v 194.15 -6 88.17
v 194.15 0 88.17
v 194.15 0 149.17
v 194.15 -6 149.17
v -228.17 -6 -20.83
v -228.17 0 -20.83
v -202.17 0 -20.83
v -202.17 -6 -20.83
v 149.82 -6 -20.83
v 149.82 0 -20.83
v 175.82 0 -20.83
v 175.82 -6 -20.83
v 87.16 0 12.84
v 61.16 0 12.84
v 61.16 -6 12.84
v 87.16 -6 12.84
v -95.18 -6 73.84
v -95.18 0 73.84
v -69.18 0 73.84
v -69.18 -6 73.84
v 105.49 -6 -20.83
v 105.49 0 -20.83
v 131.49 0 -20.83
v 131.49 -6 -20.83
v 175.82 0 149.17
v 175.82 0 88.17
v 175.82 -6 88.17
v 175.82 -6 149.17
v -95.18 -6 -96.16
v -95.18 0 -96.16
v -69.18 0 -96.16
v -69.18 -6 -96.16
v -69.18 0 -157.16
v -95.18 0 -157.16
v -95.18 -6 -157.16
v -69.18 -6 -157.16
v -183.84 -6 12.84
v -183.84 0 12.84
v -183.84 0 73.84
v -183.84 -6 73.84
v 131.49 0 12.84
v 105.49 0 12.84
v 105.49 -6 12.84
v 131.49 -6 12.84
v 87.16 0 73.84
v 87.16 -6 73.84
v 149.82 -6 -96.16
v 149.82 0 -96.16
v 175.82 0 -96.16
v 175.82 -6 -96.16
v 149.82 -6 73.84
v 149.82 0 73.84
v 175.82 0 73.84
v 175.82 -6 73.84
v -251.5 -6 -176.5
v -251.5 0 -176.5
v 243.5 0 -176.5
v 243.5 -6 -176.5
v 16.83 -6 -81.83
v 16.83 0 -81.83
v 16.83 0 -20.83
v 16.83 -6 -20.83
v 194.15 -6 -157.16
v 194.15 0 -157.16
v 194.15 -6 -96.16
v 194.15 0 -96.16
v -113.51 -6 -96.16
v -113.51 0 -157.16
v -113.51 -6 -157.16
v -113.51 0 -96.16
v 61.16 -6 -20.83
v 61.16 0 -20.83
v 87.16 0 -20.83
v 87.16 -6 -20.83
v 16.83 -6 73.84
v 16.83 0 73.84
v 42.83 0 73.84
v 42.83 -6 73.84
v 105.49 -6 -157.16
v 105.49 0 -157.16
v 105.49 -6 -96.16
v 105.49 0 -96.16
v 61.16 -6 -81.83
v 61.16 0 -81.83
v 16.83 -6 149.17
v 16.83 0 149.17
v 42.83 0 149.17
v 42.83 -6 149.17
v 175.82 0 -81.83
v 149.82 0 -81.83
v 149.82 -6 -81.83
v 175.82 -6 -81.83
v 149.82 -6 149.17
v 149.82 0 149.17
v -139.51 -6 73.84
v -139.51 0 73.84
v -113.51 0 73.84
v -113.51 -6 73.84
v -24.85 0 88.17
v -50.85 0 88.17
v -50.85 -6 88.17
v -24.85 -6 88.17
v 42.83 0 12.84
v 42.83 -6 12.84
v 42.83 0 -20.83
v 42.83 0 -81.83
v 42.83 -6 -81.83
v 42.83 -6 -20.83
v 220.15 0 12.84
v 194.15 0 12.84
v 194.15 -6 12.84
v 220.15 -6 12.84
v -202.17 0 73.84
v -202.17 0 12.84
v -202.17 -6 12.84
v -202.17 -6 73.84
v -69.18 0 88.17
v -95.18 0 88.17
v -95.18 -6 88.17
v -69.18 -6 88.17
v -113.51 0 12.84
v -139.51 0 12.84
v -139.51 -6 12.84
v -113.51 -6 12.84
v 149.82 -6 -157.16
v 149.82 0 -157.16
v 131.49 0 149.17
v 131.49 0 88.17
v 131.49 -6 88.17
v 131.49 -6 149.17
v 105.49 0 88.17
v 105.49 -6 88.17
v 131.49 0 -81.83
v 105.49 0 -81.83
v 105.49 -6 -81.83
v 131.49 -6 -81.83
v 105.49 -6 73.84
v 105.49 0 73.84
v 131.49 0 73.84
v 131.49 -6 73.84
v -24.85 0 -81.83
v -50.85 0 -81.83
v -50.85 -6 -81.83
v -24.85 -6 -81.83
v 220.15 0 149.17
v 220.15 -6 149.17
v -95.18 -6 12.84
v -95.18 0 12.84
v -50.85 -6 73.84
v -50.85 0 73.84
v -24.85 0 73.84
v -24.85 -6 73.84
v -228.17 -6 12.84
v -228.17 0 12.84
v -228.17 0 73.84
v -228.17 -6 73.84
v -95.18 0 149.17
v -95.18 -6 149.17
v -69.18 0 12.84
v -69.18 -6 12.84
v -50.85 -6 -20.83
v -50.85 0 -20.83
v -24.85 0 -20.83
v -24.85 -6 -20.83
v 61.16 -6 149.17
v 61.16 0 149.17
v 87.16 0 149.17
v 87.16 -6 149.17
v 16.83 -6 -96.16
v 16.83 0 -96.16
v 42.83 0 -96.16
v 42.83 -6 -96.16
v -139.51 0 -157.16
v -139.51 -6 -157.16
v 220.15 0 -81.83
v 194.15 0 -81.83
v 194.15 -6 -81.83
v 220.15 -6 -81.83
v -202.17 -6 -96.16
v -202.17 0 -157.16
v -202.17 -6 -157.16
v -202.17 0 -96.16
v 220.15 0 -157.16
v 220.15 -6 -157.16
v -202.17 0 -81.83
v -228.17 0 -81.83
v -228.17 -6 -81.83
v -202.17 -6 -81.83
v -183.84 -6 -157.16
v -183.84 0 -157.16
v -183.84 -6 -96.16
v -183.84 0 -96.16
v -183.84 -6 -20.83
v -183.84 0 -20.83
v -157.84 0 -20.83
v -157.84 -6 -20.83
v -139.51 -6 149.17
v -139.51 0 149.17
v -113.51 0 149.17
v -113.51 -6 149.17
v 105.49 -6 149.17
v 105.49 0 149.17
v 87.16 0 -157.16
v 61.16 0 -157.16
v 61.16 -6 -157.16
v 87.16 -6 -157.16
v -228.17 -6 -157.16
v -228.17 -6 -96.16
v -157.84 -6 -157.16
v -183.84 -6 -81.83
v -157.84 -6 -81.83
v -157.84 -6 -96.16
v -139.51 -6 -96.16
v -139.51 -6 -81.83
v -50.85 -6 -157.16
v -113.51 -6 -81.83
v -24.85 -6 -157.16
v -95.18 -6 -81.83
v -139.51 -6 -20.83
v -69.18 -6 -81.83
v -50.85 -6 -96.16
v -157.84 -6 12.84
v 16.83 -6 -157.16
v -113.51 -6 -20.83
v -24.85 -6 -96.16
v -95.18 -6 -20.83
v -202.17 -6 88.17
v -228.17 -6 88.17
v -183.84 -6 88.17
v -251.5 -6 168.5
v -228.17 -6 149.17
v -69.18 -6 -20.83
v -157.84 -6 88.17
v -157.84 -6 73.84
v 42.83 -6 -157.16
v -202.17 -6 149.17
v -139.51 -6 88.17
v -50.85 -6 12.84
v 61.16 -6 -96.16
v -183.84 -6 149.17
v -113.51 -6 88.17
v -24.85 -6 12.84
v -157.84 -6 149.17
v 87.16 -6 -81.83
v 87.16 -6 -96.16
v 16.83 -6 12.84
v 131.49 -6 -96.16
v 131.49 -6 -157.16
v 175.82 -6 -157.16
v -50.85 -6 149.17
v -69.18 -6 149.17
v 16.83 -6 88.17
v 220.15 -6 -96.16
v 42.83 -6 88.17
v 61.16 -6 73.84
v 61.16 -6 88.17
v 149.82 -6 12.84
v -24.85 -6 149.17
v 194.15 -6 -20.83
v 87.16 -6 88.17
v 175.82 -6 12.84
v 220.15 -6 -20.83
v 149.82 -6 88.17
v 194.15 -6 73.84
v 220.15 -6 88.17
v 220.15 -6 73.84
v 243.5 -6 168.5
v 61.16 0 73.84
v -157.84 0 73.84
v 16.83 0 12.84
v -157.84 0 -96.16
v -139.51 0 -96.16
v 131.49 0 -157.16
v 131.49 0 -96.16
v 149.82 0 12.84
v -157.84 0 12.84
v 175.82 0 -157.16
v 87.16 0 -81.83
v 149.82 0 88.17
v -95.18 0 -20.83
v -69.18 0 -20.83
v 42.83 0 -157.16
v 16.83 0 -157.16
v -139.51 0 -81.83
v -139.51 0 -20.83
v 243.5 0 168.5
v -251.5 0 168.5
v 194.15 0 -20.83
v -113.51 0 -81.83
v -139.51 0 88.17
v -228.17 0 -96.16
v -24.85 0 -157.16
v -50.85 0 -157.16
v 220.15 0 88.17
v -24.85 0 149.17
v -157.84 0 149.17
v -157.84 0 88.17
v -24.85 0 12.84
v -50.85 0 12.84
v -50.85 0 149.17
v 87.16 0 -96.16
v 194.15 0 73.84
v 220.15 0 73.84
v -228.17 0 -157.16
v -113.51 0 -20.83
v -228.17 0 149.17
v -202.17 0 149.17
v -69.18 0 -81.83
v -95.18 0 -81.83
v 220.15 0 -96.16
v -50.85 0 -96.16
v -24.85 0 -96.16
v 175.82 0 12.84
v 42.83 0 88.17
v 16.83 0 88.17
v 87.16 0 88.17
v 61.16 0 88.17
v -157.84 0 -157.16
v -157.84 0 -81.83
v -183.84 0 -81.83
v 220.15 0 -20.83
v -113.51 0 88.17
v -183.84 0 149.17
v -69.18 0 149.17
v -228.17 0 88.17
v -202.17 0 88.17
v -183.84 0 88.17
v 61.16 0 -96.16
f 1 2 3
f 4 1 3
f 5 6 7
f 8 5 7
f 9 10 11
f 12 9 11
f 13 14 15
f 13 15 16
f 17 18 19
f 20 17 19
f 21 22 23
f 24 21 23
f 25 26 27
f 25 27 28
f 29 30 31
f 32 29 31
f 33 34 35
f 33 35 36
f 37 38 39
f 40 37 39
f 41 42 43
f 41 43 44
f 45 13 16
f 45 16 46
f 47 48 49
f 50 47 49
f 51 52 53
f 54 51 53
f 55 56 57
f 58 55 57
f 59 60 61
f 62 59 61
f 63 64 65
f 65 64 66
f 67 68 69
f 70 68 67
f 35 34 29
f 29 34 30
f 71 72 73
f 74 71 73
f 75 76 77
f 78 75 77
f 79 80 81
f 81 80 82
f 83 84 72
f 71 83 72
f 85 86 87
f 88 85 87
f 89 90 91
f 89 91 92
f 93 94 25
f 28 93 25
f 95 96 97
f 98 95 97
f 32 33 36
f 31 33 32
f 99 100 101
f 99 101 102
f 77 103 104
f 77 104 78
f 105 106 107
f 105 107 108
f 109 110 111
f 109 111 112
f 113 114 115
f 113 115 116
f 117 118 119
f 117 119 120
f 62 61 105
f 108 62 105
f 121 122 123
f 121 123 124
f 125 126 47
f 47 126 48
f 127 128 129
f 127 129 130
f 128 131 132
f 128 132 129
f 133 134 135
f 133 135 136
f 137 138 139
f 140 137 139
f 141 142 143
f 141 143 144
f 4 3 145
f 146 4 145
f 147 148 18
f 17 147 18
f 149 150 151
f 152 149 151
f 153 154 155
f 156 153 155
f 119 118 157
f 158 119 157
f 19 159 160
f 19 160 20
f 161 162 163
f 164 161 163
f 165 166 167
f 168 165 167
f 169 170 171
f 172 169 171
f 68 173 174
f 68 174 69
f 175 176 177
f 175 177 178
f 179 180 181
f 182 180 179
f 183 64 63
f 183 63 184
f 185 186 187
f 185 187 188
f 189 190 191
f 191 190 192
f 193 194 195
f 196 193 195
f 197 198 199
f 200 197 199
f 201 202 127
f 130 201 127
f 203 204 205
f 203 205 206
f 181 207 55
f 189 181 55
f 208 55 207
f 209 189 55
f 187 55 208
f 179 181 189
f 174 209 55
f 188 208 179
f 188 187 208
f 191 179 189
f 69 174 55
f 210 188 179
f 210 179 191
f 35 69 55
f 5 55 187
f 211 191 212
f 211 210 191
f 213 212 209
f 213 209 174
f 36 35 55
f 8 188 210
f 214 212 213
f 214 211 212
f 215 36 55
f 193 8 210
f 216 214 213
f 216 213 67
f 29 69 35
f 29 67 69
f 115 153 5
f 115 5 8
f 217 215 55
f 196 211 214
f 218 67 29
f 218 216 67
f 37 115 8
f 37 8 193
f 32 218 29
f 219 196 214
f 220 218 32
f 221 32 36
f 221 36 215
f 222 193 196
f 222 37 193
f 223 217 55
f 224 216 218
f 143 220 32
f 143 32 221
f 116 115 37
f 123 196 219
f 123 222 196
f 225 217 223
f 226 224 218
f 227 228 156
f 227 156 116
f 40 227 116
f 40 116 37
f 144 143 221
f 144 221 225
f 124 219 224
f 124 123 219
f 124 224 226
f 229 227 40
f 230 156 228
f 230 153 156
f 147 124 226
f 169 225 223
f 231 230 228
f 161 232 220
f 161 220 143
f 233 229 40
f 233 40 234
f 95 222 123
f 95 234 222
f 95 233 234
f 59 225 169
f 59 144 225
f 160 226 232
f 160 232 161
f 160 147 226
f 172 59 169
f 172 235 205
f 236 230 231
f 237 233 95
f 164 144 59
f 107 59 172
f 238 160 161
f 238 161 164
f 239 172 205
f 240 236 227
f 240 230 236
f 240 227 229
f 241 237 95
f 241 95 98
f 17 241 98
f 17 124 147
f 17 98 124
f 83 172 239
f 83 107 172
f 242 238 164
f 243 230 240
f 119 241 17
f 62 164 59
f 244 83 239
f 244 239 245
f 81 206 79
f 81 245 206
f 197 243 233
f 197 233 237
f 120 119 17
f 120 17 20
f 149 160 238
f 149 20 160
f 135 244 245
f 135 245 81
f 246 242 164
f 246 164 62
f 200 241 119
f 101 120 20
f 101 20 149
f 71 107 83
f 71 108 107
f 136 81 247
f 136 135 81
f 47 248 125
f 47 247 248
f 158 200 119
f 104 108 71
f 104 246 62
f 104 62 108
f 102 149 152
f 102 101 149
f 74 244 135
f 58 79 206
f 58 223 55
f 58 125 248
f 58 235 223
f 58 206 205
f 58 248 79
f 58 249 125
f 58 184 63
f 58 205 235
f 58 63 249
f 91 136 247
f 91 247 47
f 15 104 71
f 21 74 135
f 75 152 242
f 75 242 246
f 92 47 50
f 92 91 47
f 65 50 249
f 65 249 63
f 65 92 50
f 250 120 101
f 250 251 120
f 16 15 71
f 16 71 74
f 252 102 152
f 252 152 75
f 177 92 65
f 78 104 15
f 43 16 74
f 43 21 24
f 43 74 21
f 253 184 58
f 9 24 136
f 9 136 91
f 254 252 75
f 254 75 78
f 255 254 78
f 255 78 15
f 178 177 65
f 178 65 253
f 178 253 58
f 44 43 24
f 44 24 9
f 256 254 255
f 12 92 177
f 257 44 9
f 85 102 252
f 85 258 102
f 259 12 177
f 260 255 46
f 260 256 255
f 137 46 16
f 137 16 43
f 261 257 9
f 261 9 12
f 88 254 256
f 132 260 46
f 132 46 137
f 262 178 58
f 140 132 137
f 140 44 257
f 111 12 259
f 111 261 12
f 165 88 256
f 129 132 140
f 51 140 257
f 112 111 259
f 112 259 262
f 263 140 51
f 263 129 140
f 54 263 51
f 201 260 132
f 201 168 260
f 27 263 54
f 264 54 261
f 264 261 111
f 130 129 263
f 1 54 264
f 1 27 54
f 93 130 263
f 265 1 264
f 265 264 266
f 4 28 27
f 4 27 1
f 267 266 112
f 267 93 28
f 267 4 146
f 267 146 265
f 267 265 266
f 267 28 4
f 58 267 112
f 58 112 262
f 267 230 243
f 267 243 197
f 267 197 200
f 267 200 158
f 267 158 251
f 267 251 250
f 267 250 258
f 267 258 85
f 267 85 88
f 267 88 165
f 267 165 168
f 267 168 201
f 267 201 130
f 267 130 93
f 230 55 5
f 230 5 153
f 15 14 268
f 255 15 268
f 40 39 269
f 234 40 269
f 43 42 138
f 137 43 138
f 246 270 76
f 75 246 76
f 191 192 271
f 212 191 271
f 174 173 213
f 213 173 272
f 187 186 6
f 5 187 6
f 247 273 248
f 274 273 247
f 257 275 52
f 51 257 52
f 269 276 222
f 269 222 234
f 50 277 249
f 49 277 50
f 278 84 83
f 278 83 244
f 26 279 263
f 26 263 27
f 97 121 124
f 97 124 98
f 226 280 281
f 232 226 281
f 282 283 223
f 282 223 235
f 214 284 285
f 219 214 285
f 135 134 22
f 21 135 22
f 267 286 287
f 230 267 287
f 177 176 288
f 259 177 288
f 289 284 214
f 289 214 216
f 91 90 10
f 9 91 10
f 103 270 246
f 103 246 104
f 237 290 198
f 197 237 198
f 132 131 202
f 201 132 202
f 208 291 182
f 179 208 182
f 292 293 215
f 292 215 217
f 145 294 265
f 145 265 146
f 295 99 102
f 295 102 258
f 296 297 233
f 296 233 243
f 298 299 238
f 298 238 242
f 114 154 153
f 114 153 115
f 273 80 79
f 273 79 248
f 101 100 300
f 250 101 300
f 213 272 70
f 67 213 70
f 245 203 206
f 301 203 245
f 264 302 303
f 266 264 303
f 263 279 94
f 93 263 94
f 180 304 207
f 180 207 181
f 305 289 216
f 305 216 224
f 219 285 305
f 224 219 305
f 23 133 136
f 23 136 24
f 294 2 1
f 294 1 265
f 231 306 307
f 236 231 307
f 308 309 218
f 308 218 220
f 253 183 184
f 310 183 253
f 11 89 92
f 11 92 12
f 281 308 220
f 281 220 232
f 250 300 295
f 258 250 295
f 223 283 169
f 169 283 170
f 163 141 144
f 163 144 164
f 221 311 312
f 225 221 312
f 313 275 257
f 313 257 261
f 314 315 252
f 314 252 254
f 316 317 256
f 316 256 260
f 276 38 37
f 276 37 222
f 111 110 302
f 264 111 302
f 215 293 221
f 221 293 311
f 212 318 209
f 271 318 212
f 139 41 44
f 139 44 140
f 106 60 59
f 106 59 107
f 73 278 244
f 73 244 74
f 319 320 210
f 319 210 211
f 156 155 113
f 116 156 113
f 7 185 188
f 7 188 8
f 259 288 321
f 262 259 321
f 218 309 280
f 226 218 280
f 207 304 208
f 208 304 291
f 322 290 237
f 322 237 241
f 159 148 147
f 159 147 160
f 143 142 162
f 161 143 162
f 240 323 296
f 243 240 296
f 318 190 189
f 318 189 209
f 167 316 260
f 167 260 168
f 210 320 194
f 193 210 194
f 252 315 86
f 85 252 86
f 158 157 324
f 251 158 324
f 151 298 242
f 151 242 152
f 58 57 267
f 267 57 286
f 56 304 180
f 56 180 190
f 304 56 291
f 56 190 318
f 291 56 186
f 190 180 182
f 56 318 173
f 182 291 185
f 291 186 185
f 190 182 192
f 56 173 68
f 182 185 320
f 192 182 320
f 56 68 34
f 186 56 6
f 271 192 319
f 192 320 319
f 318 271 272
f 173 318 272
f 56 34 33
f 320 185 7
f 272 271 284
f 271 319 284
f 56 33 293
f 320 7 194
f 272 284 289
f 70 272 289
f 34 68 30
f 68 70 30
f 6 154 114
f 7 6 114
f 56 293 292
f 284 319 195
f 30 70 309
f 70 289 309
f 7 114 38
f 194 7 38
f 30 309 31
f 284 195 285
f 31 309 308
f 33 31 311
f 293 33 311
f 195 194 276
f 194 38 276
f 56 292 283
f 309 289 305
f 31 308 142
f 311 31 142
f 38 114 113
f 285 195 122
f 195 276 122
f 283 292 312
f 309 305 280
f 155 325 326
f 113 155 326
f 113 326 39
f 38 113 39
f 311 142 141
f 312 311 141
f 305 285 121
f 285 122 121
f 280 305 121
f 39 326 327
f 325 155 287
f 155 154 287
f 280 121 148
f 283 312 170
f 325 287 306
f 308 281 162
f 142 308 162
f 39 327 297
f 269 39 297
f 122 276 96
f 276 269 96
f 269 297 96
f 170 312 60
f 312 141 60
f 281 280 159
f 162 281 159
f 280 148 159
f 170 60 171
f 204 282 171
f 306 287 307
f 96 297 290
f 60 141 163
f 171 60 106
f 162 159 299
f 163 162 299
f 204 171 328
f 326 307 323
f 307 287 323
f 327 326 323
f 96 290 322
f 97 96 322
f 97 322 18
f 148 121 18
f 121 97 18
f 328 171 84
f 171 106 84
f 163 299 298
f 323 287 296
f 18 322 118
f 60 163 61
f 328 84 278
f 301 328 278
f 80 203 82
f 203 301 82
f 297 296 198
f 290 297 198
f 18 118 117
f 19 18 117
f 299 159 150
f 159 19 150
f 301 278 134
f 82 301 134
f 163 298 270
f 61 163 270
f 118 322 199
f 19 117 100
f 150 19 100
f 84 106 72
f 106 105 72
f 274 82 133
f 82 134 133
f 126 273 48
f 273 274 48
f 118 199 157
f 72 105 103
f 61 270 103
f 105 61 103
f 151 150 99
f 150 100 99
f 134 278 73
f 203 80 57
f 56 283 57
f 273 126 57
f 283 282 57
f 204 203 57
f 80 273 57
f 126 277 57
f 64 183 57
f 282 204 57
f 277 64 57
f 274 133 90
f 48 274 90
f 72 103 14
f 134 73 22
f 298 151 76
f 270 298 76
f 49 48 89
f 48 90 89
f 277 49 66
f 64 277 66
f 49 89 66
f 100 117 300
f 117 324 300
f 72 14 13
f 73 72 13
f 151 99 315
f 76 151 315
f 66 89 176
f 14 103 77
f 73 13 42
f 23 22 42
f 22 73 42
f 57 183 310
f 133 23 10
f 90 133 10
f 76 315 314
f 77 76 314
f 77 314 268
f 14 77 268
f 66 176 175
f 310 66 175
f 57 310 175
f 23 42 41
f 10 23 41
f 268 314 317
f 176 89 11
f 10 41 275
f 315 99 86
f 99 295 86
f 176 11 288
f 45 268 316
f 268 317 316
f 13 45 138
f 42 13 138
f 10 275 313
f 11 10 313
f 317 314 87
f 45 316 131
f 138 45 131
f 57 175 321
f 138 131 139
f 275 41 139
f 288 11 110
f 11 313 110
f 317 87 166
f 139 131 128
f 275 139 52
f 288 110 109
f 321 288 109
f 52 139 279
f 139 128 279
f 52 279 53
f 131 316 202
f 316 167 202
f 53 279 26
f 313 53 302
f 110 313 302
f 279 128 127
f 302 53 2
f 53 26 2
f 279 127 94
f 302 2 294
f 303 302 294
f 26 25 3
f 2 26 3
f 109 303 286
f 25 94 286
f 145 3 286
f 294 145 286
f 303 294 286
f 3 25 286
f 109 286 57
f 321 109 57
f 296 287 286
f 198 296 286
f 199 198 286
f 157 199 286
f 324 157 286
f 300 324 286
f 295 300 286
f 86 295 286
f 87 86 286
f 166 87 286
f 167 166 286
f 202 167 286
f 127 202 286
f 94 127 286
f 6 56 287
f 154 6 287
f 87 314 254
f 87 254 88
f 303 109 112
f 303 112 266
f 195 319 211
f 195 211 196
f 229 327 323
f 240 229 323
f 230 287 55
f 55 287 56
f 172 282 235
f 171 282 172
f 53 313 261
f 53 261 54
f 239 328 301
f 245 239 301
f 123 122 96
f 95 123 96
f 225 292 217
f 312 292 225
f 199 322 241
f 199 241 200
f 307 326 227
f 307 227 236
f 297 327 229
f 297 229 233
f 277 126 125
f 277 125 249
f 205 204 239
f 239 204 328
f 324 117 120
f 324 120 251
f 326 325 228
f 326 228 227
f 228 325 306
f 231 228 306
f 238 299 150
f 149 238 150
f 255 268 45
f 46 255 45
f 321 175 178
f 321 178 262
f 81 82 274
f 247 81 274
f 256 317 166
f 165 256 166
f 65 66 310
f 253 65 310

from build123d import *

# Parameters (mm, degrees)
F0_W     = 26
F0_H     = 61
F1_DEPTH = 6


with BuildPart() as f1:
    # F0 (on Front) → F1 (new body)
    with BuildSketch(Plane.XZ):
        Polygon((-231.5, -176.5), (223.5, -176.5), (243.5, -176.5), (243.5, -156.5), (243.5, 148.5), (243.5, 168.5), (227.5, 168.5), (-227.5, 168.5), (-251.5, 168.5), (-251.5, 152.5), (-251.5, -152.5), (-251.5, -176.5), align=None)
        with Locations((-215.17, -126.66)):
            Rectangle(F0_W, F0_H, mode=Mode.SUBTRACT)
        with Locations((-170.84, -126.66)):
            Rectangle(F0_W, F0_H, mode=Mode.SUBTRACT)
        with Locations((-126.51, -126.66)):
            Rectangle(F0_W, F0_H, mode=Mode.SUBTRACT)
        with Locations((-82.18, -126.66)):
            Rectangle(F0_W, F0_H, mode=Mode.SUBTRACT)
        with Locations((-37.85, -126.66)):
            Rectangle(F0_W, F0_H, mode=Mode.SUBTRACT)
        with Locations((-215.17, -51.33)):
            Rectangle(F0_W, F0_H, mode=Mode.SUBTRACT)
        with Locations((-170.84, -51.33)):
            Rectangle(F0_W, F0_H, mode=Mode.SUBTRACT)
        with Locations((-126.51, -51.33)):
            Rectangle(F0_W, F0_H, mode=Mode.SUBTRACT)
        with Locations((-82.18, -51.33)):
            Rectangle(F0_W, F0_H, mode=Mode.SUBTRACT)
        with Locations((-37.85, -51.33)):
            Rectangle(F0_W, F0_H, mode=Mode.SUBTRACT)
        with Locations((29.83, -126.66)):
            Rectangle(F0_W, F0_H, mode=Mode.SUBTRACT)
        with Locations((74.16, -126.66)):
            Rectangle(F0_W, F0_H, mode=Mode.SUBTRACT)
        with Locations((118.49, -126.66)):
            Rectangle(F0_W, F0_H, mode=Mode.SUBTRACT)
        with Locations((162.82, -126.66)):
            Rectangle(F0_W, F0_H, mode=Mode.SUBTRACT)
        with Locations((207.15, -126.66)):
            Rectangle(F0_W, F0_H, mode=Mode.SUBTRACT)
        with Locations((29.83, -51.33)):
            Rectangle(F0_W, F0_H, mode=Mode.SUBTRACT)
        with Locations((74.16, -51.33)):
            Rectangle(F0_W, F0_H, mode=Mode.SUBTRACT)
        with Locations((118.49, -51.33)):
            Rectangle(F0_W, F0_H, mode=Mode.SUBTRACT)
        with Locations((162.82, -51.33)):
            Rectangle(F0_W, F0_H, mode=Mode.SUBTRACT)
        with Locations((207.15, -51.33)):
            Rectangle(F0_W, F0_H, mode=Mode.SUBTRACT)
        with Locations((-215.17, 43.34)):
            Rectangle(F0_W, F0_H, mode=Mode.SUBTRACT)
        with Locations((-170.84, 43.34)):
            Rectangle(F0_W, F0_H, mode=Mode.SUBTRACT)
        with Locations((-126.51, 43.34)):
            Rectangle(F0_W, F0_H, mode=Mode.SUBTRACT)
        with Locations((-82.18, 43.34)):
            Rectangle(F0_W, F0_H, mode=Mode.SUBTRACT)
        with Locations((-37.85, 43.34)):
            Rectangle(F0_W, F0_H, mode=Mode.SUBTRACT)
        with Locations((-215.17, 118.67)):
            Rectangle(F0_W, F0_H, mode=Mode.SUBTRACT)
        with Locations((-170.84, 118.67)):
            Rectangle(F0_W, F0_H, mode=Mode.SUBTRACT)
        with Locations((-126.51, 118.67)):
            Rectangle(F0_W, F0_H, mode=Mode.SUBTRACT)
        with Locations((-82.18, 118.67)):
            Rectangle(F0_W, F0_H, mode=Mode.SUBTRACT)
        with Locations((-37.85, 118.67)):
            Rectangle(F0_W, F0_H, mode=Mode.SUBTRACT)
        with Locations((29.83, 43.34)):
            Rectangle(F0_W, F0_H, mode=Mode.SUBTRACT)
        with Locations((74.16, 43.34)):
            Rectangle(F0_W, F0_H, mode=Mode.SUBTRACT)
        with Locations((118.49, 43.34)):
            Rectangle(F0_W, F0_H, mode=Mode.SUBTRACT)
        with Locations((162.82, 43.34)):
            Rectangle(F0_W, F0_H, mode=Mode.SUBTRACT)
        with Locations((207.15, 43.34)):
            Rectangle(F0_W, F0_H, mode=Mode.SUBTRACT)
        with Locations((29.83, 118.67)):
            Rectangle(F0_W, F0_H, mode=Mode.SUBTRACT)
        with Locations((74.16, 118.67)):
            Rectangle(F0_W, F0_H, mode=Mode.SUBTRACT)
        with Locations((118.49, 118.67)):
            Rectangle(F0_W, F0_H, mode=Mode.SUBTRACT)
        with Locations((162.82, 118.67)):
            Rectangle(F0_W, F0_H, mode=Mode.SUBTRACT)
        with Locations((207.15, 118.67)):
            Rectangle(F0_W, F0_H, mode=Mode.SUBTRACT)
    extrude(amount=F1_DEPTH)


solid = f1.part
